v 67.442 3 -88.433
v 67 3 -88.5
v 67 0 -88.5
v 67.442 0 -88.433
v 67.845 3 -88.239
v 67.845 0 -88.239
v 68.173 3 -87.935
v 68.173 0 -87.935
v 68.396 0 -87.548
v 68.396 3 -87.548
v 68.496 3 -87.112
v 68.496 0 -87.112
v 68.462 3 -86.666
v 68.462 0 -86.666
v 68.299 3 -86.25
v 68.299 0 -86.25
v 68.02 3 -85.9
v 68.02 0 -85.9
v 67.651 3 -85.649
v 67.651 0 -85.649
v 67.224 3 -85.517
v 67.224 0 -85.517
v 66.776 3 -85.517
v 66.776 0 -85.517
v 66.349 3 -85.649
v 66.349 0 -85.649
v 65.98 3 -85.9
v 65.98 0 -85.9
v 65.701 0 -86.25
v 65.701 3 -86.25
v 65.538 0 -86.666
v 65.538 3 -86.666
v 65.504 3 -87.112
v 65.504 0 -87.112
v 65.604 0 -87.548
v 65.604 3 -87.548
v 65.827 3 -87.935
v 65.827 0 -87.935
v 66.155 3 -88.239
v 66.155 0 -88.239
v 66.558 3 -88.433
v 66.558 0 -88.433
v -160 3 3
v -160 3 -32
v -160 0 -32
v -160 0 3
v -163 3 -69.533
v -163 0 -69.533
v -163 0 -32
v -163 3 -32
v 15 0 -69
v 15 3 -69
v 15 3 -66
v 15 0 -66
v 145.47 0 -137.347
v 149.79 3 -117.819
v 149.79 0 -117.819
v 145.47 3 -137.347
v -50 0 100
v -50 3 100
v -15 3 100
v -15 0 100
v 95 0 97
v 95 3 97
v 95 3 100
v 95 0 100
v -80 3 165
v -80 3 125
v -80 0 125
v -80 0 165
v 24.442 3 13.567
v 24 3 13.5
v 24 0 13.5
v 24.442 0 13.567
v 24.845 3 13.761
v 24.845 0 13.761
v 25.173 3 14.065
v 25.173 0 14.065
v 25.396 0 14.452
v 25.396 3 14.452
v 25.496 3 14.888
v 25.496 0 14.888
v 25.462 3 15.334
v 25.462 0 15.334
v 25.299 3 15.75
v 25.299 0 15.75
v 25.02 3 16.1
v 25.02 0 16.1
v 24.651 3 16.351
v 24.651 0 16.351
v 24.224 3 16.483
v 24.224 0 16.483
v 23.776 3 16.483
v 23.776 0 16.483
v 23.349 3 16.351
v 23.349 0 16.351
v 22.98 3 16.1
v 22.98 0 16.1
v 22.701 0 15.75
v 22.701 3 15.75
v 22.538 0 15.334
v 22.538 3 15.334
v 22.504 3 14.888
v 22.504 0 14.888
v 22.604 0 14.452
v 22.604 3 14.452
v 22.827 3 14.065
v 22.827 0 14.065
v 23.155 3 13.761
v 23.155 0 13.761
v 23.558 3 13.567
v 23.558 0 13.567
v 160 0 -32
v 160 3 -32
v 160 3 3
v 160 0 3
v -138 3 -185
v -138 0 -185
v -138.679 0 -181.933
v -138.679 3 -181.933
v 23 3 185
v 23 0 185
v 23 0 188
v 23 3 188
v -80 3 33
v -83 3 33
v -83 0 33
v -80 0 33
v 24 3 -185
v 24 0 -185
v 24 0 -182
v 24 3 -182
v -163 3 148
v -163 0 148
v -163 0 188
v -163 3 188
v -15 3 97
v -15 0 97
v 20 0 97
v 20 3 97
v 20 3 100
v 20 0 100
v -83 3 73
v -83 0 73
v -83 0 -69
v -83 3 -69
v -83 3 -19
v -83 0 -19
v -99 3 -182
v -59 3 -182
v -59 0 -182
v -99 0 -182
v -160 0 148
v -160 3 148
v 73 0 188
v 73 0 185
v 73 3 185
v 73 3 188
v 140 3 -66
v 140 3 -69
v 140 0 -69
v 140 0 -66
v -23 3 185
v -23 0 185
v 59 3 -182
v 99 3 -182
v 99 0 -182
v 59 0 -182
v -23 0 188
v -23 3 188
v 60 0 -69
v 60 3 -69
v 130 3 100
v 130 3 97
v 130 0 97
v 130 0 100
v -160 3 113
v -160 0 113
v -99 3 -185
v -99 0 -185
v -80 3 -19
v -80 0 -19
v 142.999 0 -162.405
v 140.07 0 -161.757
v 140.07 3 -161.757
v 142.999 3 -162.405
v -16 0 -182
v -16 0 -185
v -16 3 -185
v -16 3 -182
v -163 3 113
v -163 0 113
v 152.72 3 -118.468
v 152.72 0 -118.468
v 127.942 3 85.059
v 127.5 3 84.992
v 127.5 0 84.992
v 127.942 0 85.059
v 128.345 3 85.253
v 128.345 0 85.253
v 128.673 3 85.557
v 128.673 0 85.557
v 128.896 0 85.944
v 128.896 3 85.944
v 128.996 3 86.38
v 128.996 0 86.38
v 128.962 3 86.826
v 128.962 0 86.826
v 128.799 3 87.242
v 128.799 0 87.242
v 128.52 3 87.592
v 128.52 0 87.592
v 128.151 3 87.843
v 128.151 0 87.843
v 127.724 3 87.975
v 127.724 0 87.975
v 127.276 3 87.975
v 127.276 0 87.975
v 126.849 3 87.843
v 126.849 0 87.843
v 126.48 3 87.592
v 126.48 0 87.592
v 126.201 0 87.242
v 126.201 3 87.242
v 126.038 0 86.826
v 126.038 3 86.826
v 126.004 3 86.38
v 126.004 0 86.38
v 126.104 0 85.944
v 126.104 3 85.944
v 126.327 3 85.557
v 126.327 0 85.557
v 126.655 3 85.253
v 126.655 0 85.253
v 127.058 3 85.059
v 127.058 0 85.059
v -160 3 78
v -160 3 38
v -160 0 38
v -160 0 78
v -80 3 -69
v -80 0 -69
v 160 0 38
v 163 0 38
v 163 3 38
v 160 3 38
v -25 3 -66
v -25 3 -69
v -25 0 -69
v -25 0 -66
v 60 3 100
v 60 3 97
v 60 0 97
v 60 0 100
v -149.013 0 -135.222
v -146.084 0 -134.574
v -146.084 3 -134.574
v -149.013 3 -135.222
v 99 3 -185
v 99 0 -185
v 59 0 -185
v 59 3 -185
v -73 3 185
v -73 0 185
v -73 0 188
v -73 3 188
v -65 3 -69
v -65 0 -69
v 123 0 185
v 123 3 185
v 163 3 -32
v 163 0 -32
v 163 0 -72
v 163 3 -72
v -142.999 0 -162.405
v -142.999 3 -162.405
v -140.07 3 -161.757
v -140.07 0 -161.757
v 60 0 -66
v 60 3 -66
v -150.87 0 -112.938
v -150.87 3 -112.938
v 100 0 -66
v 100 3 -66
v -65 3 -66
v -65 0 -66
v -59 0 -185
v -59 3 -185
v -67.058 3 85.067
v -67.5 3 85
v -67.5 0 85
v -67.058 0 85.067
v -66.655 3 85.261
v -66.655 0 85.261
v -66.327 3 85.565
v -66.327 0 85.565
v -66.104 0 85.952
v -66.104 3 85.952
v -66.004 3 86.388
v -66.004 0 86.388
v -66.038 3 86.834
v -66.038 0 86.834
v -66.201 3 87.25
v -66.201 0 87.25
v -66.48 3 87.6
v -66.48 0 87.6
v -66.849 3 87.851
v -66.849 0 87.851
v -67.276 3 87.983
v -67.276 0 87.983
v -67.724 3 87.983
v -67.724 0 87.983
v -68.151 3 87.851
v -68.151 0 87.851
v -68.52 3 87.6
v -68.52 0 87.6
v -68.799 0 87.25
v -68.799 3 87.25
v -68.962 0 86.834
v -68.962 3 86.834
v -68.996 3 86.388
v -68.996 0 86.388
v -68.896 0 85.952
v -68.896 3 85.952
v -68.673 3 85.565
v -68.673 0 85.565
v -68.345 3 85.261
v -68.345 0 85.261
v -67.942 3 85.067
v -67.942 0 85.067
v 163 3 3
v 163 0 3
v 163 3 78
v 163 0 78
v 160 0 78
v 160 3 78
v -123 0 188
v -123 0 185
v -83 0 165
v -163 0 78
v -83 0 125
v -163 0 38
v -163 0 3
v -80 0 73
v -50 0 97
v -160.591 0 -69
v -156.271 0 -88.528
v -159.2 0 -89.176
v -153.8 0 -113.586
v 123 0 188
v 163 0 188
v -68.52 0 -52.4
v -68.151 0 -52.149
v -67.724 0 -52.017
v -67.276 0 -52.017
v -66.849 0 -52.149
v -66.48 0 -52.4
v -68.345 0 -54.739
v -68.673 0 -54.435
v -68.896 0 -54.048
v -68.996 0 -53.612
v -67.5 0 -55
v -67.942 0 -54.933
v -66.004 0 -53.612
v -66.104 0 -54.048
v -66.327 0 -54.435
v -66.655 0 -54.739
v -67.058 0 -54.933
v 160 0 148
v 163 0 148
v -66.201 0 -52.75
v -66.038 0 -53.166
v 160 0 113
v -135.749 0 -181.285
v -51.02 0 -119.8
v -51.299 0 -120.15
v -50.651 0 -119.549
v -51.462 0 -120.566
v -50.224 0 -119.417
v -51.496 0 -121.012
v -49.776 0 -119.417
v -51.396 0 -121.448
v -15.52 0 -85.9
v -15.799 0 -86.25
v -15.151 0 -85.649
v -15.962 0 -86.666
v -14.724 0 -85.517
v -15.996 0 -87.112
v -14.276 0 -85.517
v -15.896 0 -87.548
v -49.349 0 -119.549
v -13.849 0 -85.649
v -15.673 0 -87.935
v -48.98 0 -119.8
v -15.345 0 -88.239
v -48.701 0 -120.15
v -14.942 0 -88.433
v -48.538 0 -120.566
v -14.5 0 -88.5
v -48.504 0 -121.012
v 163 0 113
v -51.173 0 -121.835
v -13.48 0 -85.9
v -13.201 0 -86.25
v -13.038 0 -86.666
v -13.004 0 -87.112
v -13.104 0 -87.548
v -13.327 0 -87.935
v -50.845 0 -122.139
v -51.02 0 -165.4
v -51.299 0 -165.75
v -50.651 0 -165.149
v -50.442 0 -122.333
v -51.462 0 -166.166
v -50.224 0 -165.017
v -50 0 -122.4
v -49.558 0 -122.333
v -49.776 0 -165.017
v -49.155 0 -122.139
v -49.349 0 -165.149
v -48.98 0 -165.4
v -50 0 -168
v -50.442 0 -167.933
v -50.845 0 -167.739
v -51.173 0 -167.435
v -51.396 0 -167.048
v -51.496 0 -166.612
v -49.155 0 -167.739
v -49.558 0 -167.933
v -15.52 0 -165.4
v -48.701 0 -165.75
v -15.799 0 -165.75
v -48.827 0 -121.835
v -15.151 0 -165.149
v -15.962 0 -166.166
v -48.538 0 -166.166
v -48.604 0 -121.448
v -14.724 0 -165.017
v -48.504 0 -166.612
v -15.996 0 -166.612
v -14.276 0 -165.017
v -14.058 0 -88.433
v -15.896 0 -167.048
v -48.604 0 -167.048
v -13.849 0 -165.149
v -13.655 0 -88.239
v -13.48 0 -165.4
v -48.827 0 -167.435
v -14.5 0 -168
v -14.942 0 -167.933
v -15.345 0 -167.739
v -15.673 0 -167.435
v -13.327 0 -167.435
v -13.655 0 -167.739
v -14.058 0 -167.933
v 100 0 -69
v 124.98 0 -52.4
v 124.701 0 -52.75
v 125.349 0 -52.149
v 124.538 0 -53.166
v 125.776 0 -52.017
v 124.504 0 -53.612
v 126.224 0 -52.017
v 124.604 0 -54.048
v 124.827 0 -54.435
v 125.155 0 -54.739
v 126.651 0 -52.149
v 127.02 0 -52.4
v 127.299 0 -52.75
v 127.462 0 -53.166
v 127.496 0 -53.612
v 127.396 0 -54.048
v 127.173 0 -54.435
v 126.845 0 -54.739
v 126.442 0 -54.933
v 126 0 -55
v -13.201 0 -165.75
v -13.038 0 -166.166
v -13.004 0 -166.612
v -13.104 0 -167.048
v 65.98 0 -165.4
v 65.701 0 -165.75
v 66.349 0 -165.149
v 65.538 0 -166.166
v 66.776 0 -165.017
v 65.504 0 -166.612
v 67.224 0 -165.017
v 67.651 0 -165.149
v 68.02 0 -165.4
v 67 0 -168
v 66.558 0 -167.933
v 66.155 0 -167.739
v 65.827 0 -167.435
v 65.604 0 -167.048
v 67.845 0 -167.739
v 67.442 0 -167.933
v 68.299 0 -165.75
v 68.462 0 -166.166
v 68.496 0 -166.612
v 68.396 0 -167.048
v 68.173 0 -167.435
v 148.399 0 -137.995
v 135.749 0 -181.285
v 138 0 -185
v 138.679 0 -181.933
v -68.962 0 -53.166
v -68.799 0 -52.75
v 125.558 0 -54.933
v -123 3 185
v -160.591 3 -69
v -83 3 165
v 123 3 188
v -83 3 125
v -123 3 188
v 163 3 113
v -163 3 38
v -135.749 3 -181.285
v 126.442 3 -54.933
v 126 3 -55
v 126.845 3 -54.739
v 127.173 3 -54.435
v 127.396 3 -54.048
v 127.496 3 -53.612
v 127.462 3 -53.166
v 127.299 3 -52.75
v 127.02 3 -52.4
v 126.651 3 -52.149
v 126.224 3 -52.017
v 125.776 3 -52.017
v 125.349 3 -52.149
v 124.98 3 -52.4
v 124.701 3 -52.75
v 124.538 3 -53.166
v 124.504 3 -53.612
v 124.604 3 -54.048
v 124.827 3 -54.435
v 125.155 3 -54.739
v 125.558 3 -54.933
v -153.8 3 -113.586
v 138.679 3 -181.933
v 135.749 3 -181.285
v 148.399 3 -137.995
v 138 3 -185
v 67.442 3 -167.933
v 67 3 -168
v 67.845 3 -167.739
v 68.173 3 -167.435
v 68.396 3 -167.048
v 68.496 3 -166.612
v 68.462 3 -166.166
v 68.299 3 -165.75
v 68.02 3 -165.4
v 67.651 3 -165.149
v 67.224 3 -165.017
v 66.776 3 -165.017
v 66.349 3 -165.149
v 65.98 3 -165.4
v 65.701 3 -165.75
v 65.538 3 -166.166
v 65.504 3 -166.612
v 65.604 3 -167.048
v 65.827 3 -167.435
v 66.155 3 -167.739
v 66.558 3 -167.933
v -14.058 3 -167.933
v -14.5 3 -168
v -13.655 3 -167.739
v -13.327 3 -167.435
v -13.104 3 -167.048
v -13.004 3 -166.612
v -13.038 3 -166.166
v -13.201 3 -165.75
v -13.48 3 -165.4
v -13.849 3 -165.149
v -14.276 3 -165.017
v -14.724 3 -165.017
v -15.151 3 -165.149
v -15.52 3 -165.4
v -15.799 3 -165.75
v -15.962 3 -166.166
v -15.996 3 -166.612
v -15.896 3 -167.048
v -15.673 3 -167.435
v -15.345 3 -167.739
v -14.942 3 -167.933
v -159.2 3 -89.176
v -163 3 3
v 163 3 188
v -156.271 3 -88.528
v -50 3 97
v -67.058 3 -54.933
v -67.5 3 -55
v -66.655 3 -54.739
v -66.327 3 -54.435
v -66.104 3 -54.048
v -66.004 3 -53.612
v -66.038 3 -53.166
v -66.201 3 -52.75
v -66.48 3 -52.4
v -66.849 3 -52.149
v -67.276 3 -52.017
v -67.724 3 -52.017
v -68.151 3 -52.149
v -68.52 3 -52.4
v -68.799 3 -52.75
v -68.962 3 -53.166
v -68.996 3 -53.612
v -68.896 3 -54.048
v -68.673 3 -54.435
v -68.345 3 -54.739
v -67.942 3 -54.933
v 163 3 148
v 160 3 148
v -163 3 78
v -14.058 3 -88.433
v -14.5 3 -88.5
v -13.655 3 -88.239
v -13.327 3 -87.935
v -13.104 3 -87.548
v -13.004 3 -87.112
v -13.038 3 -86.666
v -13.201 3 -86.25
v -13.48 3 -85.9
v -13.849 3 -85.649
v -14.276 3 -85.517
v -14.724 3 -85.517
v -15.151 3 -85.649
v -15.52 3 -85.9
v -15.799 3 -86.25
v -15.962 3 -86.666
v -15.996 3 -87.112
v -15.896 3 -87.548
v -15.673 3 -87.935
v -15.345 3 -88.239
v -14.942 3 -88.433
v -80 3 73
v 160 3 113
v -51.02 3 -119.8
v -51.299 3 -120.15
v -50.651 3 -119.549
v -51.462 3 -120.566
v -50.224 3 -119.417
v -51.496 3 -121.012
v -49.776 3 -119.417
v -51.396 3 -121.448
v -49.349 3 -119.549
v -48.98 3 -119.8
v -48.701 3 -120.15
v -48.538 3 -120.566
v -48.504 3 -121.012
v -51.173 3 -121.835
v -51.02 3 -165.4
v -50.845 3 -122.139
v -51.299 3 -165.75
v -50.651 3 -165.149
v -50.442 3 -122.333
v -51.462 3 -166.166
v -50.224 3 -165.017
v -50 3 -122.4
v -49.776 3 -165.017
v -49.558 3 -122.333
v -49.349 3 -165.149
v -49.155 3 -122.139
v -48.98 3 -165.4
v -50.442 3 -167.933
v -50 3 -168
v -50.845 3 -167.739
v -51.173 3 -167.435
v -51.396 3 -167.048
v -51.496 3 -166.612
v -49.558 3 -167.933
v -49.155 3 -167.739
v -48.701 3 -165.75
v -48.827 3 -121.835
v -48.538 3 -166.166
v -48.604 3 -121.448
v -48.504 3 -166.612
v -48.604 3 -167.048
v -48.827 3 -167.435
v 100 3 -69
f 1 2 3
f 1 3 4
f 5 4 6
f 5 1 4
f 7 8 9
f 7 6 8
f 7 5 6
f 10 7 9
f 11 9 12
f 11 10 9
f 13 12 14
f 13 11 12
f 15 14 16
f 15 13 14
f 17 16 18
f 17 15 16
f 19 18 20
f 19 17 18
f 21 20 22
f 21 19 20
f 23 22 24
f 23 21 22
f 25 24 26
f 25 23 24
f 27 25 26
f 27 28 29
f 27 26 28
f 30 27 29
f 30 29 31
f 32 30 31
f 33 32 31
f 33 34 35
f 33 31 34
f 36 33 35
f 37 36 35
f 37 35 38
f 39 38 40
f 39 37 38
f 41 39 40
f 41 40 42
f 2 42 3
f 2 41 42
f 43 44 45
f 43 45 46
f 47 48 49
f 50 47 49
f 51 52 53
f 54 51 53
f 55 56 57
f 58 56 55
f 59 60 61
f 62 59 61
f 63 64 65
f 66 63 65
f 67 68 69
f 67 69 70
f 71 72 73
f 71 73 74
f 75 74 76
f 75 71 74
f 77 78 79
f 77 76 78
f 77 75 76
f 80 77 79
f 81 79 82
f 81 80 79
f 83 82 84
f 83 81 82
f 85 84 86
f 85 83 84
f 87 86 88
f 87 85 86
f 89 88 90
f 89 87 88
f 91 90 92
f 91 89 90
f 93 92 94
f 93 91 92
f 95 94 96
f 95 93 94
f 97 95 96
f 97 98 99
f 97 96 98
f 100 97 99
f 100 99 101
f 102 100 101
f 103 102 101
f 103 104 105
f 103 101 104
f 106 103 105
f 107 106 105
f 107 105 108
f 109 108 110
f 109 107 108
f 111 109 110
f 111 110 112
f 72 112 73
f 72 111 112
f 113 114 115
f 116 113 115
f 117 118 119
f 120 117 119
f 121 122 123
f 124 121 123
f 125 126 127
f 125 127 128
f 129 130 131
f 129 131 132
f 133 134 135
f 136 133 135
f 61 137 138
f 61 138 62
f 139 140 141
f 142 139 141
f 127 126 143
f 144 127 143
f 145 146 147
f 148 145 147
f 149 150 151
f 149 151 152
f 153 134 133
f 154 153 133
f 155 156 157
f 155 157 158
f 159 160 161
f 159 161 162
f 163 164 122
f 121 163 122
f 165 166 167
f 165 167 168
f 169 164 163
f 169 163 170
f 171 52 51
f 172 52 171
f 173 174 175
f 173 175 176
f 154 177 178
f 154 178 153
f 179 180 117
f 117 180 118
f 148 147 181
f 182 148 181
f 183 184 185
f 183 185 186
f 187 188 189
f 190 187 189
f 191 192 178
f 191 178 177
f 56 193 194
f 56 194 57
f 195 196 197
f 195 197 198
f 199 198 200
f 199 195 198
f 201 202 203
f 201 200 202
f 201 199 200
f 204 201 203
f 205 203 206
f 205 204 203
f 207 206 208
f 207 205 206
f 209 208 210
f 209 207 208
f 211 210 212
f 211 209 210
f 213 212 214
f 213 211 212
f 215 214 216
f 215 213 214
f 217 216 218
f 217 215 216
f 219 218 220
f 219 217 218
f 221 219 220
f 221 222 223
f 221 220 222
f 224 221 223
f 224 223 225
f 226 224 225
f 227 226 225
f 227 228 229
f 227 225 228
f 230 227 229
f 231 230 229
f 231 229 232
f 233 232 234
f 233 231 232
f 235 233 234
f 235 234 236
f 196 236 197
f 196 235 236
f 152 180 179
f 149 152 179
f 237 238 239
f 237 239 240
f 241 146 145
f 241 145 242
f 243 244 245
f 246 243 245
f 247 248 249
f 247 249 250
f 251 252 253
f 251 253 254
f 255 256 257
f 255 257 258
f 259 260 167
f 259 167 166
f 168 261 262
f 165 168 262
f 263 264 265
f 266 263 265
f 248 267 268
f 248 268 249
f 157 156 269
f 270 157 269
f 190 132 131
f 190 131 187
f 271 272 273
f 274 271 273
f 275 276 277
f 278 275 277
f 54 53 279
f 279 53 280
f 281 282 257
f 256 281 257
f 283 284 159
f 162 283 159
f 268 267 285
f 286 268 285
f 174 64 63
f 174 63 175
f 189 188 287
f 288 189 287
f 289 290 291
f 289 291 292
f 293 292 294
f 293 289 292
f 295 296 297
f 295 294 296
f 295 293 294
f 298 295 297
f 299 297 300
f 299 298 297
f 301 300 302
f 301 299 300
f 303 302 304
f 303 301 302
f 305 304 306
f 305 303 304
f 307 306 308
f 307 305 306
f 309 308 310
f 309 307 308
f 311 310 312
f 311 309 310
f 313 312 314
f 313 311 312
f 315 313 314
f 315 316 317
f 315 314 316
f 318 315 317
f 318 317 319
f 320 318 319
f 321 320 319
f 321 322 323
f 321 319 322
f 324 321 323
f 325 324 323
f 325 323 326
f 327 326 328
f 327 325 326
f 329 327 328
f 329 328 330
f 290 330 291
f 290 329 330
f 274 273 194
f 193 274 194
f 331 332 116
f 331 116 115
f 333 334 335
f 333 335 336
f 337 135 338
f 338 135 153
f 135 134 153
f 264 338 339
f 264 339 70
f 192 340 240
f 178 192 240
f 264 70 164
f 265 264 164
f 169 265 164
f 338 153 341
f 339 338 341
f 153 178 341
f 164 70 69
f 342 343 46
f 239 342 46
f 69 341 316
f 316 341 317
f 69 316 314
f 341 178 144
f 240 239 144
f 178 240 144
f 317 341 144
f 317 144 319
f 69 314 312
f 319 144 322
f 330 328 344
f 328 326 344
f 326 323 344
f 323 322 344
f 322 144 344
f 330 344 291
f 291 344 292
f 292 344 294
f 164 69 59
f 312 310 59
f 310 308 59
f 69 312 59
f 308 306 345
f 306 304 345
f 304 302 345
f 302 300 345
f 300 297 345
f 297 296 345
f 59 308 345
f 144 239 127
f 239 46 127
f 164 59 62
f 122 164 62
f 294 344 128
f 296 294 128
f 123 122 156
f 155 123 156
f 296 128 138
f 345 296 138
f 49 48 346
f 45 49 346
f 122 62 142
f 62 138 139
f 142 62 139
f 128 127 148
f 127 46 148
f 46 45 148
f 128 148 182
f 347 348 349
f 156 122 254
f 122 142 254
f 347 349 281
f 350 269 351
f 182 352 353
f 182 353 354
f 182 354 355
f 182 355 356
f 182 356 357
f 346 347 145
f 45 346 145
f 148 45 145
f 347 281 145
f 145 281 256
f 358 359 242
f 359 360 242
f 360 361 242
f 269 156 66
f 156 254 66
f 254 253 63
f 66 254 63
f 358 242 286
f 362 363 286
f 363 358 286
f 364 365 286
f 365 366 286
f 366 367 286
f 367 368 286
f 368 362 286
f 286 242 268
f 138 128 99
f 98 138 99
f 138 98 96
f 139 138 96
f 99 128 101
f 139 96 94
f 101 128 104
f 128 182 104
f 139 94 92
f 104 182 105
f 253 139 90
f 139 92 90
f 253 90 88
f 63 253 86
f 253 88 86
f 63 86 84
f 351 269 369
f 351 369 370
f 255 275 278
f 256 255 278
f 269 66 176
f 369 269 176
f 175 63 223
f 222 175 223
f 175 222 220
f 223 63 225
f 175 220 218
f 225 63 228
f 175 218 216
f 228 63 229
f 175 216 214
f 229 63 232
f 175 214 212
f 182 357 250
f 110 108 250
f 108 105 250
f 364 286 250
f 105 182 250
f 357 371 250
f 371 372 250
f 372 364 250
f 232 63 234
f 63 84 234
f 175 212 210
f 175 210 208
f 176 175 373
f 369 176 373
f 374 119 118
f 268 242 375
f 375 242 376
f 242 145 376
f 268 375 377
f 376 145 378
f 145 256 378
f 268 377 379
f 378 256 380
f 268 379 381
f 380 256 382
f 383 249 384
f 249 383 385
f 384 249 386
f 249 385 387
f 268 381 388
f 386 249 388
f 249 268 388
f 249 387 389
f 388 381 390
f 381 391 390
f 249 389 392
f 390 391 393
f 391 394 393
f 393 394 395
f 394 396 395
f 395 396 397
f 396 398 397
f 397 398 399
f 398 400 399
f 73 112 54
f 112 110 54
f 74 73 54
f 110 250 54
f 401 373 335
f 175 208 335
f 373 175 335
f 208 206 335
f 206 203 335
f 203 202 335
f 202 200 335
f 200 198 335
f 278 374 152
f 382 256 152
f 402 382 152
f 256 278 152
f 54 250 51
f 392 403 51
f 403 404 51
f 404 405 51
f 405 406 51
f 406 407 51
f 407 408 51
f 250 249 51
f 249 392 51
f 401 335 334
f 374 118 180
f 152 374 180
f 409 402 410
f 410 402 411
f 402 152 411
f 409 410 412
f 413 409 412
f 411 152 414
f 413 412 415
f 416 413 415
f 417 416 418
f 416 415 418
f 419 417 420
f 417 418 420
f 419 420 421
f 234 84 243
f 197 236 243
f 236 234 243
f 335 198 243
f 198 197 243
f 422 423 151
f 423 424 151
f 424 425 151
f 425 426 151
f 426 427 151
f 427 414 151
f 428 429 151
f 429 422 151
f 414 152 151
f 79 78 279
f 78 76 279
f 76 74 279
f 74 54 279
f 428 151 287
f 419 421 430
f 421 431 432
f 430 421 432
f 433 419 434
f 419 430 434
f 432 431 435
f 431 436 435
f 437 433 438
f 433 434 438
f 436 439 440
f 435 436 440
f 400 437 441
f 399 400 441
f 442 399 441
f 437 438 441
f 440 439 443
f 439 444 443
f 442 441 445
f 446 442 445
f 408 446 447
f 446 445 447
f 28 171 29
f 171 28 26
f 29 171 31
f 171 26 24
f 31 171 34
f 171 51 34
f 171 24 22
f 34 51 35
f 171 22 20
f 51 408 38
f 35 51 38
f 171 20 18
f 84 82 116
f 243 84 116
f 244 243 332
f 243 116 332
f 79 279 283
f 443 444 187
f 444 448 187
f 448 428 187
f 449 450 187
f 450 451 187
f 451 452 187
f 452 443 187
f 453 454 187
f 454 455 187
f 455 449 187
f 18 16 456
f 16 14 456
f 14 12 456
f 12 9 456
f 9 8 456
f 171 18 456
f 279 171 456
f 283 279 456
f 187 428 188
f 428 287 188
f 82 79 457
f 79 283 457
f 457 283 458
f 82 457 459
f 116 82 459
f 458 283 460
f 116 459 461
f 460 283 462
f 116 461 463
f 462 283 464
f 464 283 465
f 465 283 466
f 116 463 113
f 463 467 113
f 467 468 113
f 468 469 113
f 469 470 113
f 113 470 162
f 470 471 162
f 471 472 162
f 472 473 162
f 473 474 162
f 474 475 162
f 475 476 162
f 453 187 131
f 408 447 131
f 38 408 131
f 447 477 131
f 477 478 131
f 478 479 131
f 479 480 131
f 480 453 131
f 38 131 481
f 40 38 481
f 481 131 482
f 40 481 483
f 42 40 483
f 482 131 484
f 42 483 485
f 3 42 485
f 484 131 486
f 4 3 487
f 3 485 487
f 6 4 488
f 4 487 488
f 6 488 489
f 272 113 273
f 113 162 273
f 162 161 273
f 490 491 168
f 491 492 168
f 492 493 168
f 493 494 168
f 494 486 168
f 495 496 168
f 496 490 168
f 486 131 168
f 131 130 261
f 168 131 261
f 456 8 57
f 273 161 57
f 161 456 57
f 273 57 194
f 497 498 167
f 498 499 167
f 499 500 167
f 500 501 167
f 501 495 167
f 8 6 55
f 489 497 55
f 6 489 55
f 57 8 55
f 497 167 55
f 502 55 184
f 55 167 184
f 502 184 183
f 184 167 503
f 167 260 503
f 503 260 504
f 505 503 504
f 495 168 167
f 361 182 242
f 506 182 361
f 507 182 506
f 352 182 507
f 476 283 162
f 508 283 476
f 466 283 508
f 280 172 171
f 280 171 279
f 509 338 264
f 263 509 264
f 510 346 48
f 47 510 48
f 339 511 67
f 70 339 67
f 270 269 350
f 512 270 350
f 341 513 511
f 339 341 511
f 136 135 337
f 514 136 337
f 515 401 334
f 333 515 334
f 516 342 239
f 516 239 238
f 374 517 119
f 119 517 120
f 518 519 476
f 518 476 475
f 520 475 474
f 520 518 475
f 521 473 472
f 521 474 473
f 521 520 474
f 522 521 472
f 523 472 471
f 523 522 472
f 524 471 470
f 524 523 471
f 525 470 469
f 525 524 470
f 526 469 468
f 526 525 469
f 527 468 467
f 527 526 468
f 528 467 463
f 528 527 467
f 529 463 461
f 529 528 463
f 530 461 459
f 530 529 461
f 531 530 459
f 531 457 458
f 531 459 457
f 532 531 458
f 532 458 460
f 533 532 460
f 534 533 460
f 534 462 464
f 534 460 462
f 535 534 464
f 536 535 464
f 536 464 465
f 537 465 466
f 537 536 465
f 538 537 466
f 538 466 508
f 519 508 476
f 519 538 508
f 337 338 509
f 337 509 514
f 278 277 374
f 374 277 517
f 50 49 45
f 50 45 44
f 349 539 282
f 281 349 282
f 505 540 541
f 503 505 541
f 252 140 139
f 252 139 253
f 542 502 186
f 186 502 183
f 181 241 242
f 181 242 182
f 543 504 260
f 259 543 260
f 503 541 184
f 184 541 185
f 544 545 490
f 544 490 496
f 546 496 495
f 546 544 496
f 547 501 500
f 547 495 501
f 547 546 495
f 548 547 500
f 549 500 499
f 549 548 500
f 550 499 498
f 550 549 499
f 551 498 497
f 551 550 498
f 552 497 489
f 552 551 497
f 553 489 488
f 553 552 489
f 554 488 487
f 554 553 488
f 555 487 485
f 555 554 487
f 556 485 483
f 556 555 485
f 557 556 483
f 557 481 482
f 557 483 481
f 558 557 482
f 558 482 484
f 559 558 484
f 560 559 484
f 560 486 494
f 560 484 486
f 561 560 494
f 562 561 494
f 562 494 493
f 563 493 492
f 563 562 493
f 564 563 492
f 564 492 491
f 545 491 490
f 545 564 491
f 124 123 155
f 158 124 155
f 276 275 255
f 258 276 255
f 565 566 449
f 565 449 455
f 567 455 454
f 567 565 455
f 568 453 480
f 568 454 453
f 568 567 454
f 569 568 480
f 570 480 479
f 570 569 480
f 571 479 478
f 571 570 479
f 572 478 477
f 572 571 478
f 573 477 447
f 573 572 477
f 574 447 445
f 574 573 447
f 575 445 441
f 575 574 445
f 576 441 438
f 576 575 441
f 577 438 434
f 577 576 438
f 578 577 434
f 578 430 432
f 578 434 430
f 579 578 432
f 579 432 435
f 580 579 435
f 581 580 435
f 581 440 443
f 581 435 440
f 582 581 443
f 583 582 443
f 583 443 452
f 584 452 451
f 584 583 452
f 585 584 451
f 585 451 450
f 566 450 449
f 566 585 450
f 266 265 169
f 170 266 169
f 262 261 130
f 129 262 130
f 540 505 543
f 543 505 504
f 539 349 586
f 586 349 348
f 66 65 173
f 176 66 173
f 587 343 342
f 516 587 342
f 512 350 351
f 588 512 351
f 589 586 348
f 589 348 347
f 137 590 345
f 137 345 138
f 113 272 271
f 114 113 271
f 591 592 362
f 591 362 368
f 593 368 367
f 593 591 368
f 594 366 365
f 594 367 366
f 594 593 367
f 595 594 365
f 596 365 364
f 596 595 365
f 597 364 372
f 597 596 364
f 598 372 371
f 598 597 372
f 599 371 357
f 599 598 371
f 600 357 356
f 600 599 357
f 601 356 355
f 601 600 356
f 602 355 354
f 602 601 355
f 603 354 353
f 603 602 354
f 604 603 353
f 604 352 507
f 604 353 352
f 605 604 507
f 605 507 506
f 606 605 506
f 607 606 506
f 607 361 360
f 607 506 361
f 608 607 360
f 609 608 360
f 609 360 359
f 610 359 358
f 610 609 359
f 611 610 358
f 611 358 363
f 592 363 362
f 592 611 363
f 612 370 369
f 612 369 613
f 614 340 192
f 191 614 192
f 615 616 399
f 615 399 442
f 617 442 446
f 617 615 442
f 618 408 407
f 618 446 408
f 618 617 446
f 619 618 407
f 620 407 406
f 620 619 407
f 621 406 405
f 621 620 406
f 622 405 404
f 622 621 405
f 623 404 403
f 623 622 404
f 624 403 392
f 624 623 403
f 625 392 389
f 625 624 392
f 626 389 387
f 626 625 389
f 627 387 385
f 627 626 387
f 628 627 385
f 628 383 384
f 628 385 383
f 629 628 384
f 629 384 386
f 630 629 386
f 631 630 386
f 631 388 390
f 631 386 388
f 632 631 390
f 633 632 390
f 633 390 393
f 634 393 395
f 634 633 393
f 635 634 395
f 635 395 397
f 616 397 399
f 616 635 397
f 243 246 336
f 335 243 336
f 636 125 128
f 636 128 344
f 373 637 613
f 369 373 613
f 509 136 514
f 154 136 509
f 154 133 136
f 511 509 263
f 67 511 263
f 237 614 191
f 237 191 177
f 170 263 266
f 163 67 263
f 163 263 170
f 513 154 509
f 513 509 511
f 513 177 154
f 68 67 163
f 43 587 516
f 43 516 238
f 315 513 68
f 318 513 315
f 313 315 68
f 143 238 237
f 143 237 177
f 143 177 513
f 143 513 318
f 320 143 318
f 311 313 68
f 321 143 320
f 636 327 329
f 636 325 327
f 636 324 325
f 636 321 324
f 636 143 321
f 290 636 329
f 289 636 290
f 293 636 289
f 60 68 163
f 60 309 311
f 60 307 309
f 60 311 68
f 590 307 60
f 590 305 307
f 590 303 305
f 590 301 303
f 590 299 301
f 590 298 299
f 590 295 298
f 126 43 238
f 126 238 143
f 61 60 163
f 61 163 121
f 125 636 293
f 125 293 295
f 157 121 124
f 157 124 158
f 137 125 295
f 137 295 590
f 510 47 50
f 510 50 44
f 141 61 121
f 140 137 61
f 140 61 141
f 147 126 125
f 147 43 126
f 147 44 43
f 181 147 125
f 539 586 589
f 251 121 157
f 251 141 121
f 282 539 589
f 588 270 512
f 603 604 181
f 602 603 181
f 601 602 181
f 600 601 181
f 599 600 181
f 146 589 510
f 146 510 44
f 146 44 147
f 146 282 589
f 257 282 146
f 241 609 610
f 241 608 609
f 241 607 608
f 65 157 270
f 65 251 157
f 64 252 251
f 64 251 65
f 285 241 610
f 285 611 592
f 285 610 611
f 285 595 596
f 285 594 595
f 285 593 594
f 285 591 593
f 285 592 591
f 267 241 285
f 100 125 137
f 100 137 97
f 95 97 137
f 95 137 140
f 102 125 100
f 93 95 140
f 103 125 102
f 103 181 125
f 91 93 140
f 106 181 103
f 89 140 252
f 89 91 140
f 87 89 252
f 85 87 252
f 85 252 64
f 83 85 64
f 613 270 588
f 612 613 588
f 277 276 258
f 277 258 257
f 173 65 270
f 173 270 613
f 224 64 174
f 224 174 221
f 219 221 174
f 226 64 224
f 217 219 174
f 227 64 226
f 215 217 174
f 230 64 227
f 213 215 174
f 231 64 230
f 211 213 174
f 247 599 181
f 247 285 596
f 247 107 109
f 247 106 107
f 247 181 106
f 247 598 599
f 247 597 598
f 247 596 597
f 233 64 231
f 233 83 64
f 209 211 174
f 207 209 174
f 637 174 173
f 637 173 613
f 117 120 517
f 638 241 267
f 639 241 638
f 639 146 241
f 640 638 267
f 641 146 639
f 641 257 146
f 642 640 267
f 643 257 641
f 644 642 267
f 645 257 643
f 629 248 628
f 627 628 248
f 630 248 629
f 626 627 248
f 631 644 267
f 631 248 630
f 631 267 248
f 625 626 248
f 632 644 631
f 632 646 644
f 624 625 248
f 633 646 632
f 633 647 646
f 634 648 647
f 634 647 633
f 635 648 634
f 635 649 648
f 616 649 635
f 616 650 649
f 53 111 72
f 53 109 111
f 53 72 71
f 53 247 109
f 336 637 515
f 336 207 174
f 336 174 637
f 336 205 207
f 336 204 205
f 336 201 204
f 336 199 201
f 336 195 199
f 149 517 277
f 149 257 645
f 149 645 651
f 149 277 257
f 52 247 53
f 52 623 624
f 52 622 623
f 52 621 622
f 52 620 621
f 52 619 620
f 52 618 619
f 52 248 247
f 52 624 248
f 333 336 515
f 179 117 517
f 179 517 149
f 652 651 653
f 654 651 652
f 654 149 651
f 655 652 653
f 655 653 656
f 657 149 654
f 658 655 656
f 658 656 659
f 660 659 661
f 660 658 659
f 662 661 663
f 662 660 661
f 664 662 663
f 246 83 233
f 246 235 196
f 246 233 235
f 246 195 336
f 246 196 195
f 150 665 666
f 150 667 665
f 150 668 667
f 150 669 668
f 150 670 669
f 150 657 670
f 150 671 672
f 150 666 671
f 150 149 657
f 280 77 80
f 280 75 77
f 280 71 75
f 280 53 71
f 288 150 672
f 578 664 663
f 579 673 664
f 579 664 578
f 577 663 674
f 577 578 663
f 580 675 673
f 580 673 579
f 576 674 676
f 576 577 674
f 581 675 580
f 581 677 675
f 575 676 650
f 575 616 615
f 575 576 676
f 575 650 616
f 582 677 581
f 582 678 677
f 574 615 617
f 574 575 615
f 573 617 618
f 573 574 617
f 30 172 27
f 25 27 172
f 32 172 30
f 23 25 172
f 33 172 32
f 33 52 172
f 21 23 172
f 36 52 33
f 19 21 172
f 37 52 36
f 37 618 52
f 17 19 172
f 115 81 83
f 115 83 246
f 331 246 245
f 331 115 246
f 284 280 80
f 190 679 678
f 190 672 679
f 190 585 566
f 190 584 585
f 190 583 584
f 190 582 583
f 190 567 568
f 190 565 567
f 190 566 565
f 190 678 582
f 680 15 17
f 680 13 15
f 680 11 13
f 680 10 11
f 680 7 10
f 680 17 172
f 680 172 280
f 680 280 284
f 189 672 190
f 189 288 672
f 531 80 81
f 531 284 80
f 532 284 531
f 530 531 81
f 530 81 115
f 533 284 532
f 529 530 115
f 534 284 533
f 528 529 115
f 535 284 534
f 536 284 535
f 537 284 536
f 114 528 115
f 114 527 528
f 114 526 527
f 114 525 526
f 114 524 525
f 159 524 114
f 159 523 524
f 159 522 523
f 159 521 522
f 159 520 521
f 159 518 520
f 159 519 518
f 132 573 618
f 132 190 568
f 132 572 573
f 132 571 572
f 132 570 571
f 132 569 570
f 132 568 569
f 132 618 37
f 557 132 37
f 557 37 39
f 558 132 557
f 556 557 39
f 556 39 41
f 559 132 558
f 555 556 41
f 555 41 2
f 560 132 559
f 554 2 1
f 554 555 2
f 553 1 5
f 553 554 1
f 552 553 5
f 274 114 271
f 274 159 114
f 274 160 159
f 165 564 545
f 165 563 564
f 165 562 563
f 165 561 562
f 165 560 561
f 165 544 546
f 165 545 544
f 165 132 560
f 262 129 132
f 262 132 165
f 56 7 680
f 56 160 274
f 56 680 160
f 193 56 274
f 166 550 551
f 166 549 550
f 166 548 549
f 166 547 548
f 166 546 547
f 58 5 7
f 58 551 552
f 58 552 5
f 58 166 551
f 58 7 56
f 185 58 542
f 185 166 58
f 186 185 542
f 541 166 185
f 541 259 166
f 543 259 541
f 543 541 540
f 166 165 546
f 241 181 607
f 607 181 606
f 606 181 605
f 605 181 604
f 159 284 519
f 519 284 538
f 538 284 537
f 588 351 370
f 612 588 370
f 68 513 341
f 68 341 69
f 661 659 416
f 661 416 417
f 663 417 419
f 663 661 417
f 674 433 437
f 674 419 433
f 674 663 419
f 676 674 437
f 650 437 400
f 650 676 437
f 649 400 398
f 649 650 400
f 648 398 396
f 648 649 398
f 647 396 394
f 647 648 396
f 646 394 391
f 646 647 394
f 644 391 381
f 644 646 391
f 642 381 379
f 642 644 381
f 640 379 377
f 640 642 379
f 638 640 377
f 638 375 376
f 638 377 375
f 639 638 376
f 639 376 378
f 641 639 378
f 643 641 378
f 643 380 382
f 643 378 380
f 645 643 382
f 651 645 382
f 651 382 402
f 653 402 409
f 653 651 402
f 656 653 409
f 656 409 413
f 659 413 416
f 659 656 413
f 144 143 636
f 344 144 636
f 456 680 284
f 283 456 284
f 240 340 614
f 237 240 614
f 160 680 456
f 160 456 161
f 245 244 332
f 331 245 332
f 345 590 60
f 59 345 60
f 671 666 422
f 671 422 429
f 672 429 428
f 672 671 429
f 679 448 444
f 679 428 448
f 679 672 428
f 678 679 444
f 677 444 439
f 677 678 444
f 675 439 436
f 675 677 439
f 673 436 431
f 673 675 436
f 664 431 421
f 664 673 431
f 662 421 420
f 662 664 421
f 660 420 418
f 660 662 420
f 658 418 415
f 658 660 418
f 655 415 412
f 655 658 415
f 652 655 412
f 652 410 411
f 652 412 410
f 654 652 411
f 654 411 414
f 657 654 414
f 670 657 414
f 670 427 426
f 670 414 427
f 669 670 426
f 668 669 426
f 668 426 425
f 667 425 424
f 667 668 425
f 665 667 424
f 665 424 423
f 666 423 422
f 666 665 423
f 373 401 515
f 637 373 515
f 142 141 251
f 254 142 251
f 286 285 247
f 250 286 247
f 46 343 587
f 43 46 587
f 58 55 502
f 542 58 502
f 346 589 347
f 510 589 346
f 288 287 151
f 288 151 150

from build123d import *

# Parameters (mm, degrees)
BOSS_EXTRUDE1_DEPTH      = 3
SKETCH2_W                = 50
SKETCH2_H                = 3
SKETCH2_W_2              = 46
CUT_EXTRUDE1_DEPTH       = 4
SKETCH4_W                = 35
SKETCH4_H                = 3
SKETCH4_W_2              = 40
CUT_EXTRUDE2_DEPTH       = 3
CUT_EXTRUDE3_START       = -326
SKETCH4_2_W              = 35
SKETCH4_2_H              = 3
SKETCH4_2_W_2            = 40
CUT_EXTRUDE3_DEPTH       = 3
SKETCH5_W                = 40
SKETCH5_H                = 3
CUT_EXTRUDE4_DEPTH       = 3
CUT_EXTRUDE5_DEPTH       = 249.841314898
CUT_EXTRUDE5_DEPTH_BACK  = 249.841314898
SKETCH6_W                = 3
SKETCH6_H                = 40
SKETCH6_H_2              = 50
CUT_EXTRUDE6_DEPTH       = 249.841314898
CUT_EXTRUDE6_DEPTH_BACK  = 249.841314898
SKETCH7_W                = 40
SKETCH7_H                = 3
SKETCH7_W_2              = 45
CUT_EXTRUDE7_DEPTH       = 249.841314898
CUT_EXTRUDE7_DEPTH_BACK  = 249.841314898
CUT_EXTRUDE8_DEPTH       = 249.841314898
CUT_EXTRUDE8_DEPTH_BACK  = 249.841314898
CUT_EXTRUDE9_DEPTH       = 249.841314898
CUT_EXTRUDE9_DEPTH_BACK  = 249.841314898
SKETCH10_W               = 35
SKETCH10_H               = 3
SKETCH10_W_2             = 40
CUT_EXTRUDE10_DEPTH      = 249.841314898
CUT_EXTRUDE10_DEPTH_BACK = 249.841314898
SKETCH11_R               = 1.5
CUT_EXTRUDE11_DEPTH      = 249.841314898
CUT_EXTRUDE11_DEPTH_BACK = 249.841314898
SKETCH12_R               = 1.5


with BuildPart() as part:
    # Sketch1 → Boss-Extrude1 (new body)
    with BuildSketch(Plane(origin=(0, 0, 0), x_dir=(1, 0, 0), z_dir=(0, 1, 0))):
        Polygon((138, 185), (-138, 185), (-163, 72), (-163, -188), (163, -188), (163, 72), align=None)
    extrude(amount=BOSS_EXTRUDE1_DEPTH)

    # Sketch2 → Cut-Extrude1 (cut)
    with BuildSketch(Plane.XZ):
        with Locations((98, 186.5)):
            Rectangle(SKETCH2_W, SKETCH2_H)
        with Locations((0, 186.5)):
            Rectangle(SKETCH2_W_2, SKETCH2_H)
        with Locations((-98, 186.5)):
            Rectangle(SKETCH2_W, SKETCH2_H)
    extrude(amount=-CUT_EXTRUDE1_DEPTH, mode=Mode.SUBTRACT)

    # Sketch4 → Cut-Extrude2 (cut)
    with BuildSketch(Plane.ZY.offset(163)):
        with Locations((130.5, 1.5)):
            Rectangle(SKETCH4_W, SKETCH4_H)
        with Locations((-14.5, 1.5)):
            Rectangle(SKETCH4_W, SKETCH4_H)
        with Locations((58, 1.5)):
            Rectangle(SKETCH4_W_2, SKETCH4_H)
    extrude(amount=-CUT_EXTRUDE2_DEPTH, mode=Mode.SUBTRACT)

    # Sketch4<2> → Cut-Extrude3 (cut)
    with BuildSketch(Plane.ZY.offset(163).offset(CUT_EXTRUDE3_START)):
        with Locations((130.5, 1.5)):
            Rectangle(SKETCH4_2_W, SKETCH4_2_H)
        with Locations((-14.5, 1.5)):
            Rectangle(SKETCH4_2_W, SKETCH4_2_H)
        with Locations((58, 1.5)):
            Rectangle(SKETCH4_2_W_2, SKETCH4_2_H)
    extrude(amount=CUT_EXTRUDE3_DEPTH, mode=Mode.SUBTRACT)

    # Sketch5 → Cut-Extrude4 (cut)
    with BuildSketch(Plane(origin=(0, 0, -185), x_dir=(-1, 0, 0), z_dir=(0, 0, -1))):
        with Locations((79, 1.5)):
            Rectangle(SKETCH5_W, SKETCH5_H)
        with Locations((-4, 1.5)):
            Rectangle(SKETCH5_W, SKETCH5_H)
        with Locations((-79, 1.5)):
            Rectangle(SKETCH5_W, SKETCH5_H)
    extrude(amount=-CUT_EXTRUDE4_DEPTH, mode=Mode.SUBTRACT)

    # Sketch6 → Cut-Extrude5 (cut, two sides: drawn at the far end of the back side and taken through both)
    with BuildSketch(Plane.XZ.offset(-CUT_EXTRUDE5_DEPTH_BACK)):
        with Locations((-81.5, 145)):
            Rectangle(SKETCH6_W, SKETCH6_H)
        with Locations((-81.5, 53)):
            Rectangle(SKETCH6_W, SKETCH6_H)
        with Locations((-81.5, -44)):
            Rectangle(SKETCH6_W, SKETCH6_H_2)
    extrude(amount=CUT_EXTRUDE5_DEPTH + CUT_EXTRUDE5_DEPTH_BACK, mode=Mode.SUBTRACT)

    # Sketch7 → Cut-Extrude6 (cut, two sides: drawn at the far end of the back side and taken through both)
    with BuildSketch(Plane.XZ.offset(-CUT_EXTRUDE6_DEPTH_BACK)):
        with Locations((120, -67.5)):
            Rectangle(SKETCH7_W, SKETCH7_H)
        with Locations((37.5, -67.5)):
            Rectangle(SKETCH7_W_2, SKETCH7_H)
        with Locations((-45, -67.5)):
            Rectangle(SKETCH7_W, SKETCH7_H)
    extrude(amount=CUT_EXTRUDE6_DEPTH + CUT_EXTRUDE6_DEPTH_BACK, mode=Mode.SUBTRACT)

    # Sketch8 → Cut-Extrude7 (cut, two sides: drawn at the far end of the back side and taken through both)
    with BuildSketch(Plane(origin=(0, 0, 0), x_dir=(-1, 0, 0), z_dir=(0, -1, 0)).offset(-CUT_EXTRUDE7_DEPTH_BACK)):
        Polygon((135.749394441, 181.284843117), (138.678564262, 181.932889537), (142.998873731, 162.405090734), (140.069703911, 161.757044314), align=None)
        Polygon((146.083574693, 134.57434838), (149.012744513, 135.222394801), (153.799647406, 113.585593727), (150.870477585, 112.937547307), align=None)
        Polygon((156.270864422, 88.527798803), (160.591173892, 69), (163.520343712, 69.64804642), (159.200034243, 89.175845223), align=None)
    extrude(amount=CUT_EXTRUDE7_DEPTH + CUT_EXTRUDE7_DEPTH_BACK, mode=Mode.SUBTRACT)

    # Sketch9 → Cut-Extrude8 (cut, two sides: drawn at the far end of the back side and taken through both)
    with BuildSketch(Plane.XZ.offset(-CUT_EXTRUDE8_DEPTH_BACK)):
        Polygon((138.678564262, -181.932889537), (135.749394441, -181.284843117), (140.069703911, -161.757044314), (142.998873731, -162.405090734), align=None)
        Polygon((145.470090748, -137.34729581), (148.399260568, -137.995342231), (152.719570038, -118.467543428), (149.790400218, -117.819497007), align=None)
    extrude(amount=CUT_EXTRUDE8_DEPTH + CUT_EXTRUDE8_DEPTH_BACK, mode=Mode.SUBTRACT)

    # Sketch10 → Cut-Extrude9 (cut, two sides: drawn at the far end of the back side and taken through both)
    with BuildSketch(Plane.XZ.offset(-CUT_EXTRUDE9_DEPTH_BACK)):
        with Locations((112.5, 98.5)):
            Rectangle(SKETCH10_W, SKETCH10_H)
        with Locations((40, 98.5)):
            Rectangle(SKETCH10_W_2, SKETCH10_H)
        with Locations((-32.5, 98.5)):
            Rectangle(SKETCH10_W, SKETCH10_H)
    extrude(amount=CUT_EXTRUDE9_DEPTH + CUT_EXTRUDE9_DEPTH_BACK, mode=Mode.SUBTRACT)

    # Sketch11 → Cut-Extrude10 (cut, two sides: drawn at the far end of the back side and taken through both)
    with BuildSketch(Plane.XZ.offset(-CUT_EXTRUDE10_DEPTH_BACK)):
        with Locations(Location((67, -166.5, 0), (0, 0, 270))):
            Circle(SKETCH11_R)
        with Locations(Location((-14.5, -166.5, 0), (0, 0, 270))):
            Circle(SKETCH11_R)
        with Locations(Location((-50, -166.5, 0), (0, 0, 270))):
            Circle(SKETCH11_R)
        with Locations(Location((67, -87, 0), (0, 0, 270))):
            Circle(SKETCH11_R)
        with Locations(Location((-14.5, -87, 0), (0, 0, 270))):
            Circle(SKETCH11_R)
        with Locations(Location((-50, -120.9, 0), (0, 0, 270))):
            Circle(SKETCH11_R)
    extrude(amount=CUT_EXTRUDE10_DEPTH + CUT_EXTRUDE10_DEPTH_BACK, mode=Mode.SUBTRACT)

    # Sketch12 → Cut-Extrude11 (cut, two sides: drawn at the far end of the back side and taken through both)
    with BuildSketch(Plane.XZ.offset(-CUT_EXTRUDE11_DEPTH_BACK)):
        with Locations(Location((126, -53.5, 0), (0, 0, 270))):
            Circle(SKETCH12_R)
        with Locations(Location((127.499999834, 86.491964057, 0), (0, 0, 270))):
            Circle(SKETCH12_R)
        with Locations(Location((-67.5, -53.5, 0), (0, 0, 270))):
            Circle(SKETCH12_R)
        with Locations(Location((-67.5, 86.5, 0), (0, 0, 270))):
            Circle(SKETCH12_R)
        with Locations(Location((24, 15, 0), (0, 0, 270))):
            Circle(SKETCH12_R)
    extrude(amount=CUT_EXTRUDE11_DEPTH + CUT_EXTRUDE11_DEPTH_BACK, mode=Mode.SUBTRACT)


solid = part.part
